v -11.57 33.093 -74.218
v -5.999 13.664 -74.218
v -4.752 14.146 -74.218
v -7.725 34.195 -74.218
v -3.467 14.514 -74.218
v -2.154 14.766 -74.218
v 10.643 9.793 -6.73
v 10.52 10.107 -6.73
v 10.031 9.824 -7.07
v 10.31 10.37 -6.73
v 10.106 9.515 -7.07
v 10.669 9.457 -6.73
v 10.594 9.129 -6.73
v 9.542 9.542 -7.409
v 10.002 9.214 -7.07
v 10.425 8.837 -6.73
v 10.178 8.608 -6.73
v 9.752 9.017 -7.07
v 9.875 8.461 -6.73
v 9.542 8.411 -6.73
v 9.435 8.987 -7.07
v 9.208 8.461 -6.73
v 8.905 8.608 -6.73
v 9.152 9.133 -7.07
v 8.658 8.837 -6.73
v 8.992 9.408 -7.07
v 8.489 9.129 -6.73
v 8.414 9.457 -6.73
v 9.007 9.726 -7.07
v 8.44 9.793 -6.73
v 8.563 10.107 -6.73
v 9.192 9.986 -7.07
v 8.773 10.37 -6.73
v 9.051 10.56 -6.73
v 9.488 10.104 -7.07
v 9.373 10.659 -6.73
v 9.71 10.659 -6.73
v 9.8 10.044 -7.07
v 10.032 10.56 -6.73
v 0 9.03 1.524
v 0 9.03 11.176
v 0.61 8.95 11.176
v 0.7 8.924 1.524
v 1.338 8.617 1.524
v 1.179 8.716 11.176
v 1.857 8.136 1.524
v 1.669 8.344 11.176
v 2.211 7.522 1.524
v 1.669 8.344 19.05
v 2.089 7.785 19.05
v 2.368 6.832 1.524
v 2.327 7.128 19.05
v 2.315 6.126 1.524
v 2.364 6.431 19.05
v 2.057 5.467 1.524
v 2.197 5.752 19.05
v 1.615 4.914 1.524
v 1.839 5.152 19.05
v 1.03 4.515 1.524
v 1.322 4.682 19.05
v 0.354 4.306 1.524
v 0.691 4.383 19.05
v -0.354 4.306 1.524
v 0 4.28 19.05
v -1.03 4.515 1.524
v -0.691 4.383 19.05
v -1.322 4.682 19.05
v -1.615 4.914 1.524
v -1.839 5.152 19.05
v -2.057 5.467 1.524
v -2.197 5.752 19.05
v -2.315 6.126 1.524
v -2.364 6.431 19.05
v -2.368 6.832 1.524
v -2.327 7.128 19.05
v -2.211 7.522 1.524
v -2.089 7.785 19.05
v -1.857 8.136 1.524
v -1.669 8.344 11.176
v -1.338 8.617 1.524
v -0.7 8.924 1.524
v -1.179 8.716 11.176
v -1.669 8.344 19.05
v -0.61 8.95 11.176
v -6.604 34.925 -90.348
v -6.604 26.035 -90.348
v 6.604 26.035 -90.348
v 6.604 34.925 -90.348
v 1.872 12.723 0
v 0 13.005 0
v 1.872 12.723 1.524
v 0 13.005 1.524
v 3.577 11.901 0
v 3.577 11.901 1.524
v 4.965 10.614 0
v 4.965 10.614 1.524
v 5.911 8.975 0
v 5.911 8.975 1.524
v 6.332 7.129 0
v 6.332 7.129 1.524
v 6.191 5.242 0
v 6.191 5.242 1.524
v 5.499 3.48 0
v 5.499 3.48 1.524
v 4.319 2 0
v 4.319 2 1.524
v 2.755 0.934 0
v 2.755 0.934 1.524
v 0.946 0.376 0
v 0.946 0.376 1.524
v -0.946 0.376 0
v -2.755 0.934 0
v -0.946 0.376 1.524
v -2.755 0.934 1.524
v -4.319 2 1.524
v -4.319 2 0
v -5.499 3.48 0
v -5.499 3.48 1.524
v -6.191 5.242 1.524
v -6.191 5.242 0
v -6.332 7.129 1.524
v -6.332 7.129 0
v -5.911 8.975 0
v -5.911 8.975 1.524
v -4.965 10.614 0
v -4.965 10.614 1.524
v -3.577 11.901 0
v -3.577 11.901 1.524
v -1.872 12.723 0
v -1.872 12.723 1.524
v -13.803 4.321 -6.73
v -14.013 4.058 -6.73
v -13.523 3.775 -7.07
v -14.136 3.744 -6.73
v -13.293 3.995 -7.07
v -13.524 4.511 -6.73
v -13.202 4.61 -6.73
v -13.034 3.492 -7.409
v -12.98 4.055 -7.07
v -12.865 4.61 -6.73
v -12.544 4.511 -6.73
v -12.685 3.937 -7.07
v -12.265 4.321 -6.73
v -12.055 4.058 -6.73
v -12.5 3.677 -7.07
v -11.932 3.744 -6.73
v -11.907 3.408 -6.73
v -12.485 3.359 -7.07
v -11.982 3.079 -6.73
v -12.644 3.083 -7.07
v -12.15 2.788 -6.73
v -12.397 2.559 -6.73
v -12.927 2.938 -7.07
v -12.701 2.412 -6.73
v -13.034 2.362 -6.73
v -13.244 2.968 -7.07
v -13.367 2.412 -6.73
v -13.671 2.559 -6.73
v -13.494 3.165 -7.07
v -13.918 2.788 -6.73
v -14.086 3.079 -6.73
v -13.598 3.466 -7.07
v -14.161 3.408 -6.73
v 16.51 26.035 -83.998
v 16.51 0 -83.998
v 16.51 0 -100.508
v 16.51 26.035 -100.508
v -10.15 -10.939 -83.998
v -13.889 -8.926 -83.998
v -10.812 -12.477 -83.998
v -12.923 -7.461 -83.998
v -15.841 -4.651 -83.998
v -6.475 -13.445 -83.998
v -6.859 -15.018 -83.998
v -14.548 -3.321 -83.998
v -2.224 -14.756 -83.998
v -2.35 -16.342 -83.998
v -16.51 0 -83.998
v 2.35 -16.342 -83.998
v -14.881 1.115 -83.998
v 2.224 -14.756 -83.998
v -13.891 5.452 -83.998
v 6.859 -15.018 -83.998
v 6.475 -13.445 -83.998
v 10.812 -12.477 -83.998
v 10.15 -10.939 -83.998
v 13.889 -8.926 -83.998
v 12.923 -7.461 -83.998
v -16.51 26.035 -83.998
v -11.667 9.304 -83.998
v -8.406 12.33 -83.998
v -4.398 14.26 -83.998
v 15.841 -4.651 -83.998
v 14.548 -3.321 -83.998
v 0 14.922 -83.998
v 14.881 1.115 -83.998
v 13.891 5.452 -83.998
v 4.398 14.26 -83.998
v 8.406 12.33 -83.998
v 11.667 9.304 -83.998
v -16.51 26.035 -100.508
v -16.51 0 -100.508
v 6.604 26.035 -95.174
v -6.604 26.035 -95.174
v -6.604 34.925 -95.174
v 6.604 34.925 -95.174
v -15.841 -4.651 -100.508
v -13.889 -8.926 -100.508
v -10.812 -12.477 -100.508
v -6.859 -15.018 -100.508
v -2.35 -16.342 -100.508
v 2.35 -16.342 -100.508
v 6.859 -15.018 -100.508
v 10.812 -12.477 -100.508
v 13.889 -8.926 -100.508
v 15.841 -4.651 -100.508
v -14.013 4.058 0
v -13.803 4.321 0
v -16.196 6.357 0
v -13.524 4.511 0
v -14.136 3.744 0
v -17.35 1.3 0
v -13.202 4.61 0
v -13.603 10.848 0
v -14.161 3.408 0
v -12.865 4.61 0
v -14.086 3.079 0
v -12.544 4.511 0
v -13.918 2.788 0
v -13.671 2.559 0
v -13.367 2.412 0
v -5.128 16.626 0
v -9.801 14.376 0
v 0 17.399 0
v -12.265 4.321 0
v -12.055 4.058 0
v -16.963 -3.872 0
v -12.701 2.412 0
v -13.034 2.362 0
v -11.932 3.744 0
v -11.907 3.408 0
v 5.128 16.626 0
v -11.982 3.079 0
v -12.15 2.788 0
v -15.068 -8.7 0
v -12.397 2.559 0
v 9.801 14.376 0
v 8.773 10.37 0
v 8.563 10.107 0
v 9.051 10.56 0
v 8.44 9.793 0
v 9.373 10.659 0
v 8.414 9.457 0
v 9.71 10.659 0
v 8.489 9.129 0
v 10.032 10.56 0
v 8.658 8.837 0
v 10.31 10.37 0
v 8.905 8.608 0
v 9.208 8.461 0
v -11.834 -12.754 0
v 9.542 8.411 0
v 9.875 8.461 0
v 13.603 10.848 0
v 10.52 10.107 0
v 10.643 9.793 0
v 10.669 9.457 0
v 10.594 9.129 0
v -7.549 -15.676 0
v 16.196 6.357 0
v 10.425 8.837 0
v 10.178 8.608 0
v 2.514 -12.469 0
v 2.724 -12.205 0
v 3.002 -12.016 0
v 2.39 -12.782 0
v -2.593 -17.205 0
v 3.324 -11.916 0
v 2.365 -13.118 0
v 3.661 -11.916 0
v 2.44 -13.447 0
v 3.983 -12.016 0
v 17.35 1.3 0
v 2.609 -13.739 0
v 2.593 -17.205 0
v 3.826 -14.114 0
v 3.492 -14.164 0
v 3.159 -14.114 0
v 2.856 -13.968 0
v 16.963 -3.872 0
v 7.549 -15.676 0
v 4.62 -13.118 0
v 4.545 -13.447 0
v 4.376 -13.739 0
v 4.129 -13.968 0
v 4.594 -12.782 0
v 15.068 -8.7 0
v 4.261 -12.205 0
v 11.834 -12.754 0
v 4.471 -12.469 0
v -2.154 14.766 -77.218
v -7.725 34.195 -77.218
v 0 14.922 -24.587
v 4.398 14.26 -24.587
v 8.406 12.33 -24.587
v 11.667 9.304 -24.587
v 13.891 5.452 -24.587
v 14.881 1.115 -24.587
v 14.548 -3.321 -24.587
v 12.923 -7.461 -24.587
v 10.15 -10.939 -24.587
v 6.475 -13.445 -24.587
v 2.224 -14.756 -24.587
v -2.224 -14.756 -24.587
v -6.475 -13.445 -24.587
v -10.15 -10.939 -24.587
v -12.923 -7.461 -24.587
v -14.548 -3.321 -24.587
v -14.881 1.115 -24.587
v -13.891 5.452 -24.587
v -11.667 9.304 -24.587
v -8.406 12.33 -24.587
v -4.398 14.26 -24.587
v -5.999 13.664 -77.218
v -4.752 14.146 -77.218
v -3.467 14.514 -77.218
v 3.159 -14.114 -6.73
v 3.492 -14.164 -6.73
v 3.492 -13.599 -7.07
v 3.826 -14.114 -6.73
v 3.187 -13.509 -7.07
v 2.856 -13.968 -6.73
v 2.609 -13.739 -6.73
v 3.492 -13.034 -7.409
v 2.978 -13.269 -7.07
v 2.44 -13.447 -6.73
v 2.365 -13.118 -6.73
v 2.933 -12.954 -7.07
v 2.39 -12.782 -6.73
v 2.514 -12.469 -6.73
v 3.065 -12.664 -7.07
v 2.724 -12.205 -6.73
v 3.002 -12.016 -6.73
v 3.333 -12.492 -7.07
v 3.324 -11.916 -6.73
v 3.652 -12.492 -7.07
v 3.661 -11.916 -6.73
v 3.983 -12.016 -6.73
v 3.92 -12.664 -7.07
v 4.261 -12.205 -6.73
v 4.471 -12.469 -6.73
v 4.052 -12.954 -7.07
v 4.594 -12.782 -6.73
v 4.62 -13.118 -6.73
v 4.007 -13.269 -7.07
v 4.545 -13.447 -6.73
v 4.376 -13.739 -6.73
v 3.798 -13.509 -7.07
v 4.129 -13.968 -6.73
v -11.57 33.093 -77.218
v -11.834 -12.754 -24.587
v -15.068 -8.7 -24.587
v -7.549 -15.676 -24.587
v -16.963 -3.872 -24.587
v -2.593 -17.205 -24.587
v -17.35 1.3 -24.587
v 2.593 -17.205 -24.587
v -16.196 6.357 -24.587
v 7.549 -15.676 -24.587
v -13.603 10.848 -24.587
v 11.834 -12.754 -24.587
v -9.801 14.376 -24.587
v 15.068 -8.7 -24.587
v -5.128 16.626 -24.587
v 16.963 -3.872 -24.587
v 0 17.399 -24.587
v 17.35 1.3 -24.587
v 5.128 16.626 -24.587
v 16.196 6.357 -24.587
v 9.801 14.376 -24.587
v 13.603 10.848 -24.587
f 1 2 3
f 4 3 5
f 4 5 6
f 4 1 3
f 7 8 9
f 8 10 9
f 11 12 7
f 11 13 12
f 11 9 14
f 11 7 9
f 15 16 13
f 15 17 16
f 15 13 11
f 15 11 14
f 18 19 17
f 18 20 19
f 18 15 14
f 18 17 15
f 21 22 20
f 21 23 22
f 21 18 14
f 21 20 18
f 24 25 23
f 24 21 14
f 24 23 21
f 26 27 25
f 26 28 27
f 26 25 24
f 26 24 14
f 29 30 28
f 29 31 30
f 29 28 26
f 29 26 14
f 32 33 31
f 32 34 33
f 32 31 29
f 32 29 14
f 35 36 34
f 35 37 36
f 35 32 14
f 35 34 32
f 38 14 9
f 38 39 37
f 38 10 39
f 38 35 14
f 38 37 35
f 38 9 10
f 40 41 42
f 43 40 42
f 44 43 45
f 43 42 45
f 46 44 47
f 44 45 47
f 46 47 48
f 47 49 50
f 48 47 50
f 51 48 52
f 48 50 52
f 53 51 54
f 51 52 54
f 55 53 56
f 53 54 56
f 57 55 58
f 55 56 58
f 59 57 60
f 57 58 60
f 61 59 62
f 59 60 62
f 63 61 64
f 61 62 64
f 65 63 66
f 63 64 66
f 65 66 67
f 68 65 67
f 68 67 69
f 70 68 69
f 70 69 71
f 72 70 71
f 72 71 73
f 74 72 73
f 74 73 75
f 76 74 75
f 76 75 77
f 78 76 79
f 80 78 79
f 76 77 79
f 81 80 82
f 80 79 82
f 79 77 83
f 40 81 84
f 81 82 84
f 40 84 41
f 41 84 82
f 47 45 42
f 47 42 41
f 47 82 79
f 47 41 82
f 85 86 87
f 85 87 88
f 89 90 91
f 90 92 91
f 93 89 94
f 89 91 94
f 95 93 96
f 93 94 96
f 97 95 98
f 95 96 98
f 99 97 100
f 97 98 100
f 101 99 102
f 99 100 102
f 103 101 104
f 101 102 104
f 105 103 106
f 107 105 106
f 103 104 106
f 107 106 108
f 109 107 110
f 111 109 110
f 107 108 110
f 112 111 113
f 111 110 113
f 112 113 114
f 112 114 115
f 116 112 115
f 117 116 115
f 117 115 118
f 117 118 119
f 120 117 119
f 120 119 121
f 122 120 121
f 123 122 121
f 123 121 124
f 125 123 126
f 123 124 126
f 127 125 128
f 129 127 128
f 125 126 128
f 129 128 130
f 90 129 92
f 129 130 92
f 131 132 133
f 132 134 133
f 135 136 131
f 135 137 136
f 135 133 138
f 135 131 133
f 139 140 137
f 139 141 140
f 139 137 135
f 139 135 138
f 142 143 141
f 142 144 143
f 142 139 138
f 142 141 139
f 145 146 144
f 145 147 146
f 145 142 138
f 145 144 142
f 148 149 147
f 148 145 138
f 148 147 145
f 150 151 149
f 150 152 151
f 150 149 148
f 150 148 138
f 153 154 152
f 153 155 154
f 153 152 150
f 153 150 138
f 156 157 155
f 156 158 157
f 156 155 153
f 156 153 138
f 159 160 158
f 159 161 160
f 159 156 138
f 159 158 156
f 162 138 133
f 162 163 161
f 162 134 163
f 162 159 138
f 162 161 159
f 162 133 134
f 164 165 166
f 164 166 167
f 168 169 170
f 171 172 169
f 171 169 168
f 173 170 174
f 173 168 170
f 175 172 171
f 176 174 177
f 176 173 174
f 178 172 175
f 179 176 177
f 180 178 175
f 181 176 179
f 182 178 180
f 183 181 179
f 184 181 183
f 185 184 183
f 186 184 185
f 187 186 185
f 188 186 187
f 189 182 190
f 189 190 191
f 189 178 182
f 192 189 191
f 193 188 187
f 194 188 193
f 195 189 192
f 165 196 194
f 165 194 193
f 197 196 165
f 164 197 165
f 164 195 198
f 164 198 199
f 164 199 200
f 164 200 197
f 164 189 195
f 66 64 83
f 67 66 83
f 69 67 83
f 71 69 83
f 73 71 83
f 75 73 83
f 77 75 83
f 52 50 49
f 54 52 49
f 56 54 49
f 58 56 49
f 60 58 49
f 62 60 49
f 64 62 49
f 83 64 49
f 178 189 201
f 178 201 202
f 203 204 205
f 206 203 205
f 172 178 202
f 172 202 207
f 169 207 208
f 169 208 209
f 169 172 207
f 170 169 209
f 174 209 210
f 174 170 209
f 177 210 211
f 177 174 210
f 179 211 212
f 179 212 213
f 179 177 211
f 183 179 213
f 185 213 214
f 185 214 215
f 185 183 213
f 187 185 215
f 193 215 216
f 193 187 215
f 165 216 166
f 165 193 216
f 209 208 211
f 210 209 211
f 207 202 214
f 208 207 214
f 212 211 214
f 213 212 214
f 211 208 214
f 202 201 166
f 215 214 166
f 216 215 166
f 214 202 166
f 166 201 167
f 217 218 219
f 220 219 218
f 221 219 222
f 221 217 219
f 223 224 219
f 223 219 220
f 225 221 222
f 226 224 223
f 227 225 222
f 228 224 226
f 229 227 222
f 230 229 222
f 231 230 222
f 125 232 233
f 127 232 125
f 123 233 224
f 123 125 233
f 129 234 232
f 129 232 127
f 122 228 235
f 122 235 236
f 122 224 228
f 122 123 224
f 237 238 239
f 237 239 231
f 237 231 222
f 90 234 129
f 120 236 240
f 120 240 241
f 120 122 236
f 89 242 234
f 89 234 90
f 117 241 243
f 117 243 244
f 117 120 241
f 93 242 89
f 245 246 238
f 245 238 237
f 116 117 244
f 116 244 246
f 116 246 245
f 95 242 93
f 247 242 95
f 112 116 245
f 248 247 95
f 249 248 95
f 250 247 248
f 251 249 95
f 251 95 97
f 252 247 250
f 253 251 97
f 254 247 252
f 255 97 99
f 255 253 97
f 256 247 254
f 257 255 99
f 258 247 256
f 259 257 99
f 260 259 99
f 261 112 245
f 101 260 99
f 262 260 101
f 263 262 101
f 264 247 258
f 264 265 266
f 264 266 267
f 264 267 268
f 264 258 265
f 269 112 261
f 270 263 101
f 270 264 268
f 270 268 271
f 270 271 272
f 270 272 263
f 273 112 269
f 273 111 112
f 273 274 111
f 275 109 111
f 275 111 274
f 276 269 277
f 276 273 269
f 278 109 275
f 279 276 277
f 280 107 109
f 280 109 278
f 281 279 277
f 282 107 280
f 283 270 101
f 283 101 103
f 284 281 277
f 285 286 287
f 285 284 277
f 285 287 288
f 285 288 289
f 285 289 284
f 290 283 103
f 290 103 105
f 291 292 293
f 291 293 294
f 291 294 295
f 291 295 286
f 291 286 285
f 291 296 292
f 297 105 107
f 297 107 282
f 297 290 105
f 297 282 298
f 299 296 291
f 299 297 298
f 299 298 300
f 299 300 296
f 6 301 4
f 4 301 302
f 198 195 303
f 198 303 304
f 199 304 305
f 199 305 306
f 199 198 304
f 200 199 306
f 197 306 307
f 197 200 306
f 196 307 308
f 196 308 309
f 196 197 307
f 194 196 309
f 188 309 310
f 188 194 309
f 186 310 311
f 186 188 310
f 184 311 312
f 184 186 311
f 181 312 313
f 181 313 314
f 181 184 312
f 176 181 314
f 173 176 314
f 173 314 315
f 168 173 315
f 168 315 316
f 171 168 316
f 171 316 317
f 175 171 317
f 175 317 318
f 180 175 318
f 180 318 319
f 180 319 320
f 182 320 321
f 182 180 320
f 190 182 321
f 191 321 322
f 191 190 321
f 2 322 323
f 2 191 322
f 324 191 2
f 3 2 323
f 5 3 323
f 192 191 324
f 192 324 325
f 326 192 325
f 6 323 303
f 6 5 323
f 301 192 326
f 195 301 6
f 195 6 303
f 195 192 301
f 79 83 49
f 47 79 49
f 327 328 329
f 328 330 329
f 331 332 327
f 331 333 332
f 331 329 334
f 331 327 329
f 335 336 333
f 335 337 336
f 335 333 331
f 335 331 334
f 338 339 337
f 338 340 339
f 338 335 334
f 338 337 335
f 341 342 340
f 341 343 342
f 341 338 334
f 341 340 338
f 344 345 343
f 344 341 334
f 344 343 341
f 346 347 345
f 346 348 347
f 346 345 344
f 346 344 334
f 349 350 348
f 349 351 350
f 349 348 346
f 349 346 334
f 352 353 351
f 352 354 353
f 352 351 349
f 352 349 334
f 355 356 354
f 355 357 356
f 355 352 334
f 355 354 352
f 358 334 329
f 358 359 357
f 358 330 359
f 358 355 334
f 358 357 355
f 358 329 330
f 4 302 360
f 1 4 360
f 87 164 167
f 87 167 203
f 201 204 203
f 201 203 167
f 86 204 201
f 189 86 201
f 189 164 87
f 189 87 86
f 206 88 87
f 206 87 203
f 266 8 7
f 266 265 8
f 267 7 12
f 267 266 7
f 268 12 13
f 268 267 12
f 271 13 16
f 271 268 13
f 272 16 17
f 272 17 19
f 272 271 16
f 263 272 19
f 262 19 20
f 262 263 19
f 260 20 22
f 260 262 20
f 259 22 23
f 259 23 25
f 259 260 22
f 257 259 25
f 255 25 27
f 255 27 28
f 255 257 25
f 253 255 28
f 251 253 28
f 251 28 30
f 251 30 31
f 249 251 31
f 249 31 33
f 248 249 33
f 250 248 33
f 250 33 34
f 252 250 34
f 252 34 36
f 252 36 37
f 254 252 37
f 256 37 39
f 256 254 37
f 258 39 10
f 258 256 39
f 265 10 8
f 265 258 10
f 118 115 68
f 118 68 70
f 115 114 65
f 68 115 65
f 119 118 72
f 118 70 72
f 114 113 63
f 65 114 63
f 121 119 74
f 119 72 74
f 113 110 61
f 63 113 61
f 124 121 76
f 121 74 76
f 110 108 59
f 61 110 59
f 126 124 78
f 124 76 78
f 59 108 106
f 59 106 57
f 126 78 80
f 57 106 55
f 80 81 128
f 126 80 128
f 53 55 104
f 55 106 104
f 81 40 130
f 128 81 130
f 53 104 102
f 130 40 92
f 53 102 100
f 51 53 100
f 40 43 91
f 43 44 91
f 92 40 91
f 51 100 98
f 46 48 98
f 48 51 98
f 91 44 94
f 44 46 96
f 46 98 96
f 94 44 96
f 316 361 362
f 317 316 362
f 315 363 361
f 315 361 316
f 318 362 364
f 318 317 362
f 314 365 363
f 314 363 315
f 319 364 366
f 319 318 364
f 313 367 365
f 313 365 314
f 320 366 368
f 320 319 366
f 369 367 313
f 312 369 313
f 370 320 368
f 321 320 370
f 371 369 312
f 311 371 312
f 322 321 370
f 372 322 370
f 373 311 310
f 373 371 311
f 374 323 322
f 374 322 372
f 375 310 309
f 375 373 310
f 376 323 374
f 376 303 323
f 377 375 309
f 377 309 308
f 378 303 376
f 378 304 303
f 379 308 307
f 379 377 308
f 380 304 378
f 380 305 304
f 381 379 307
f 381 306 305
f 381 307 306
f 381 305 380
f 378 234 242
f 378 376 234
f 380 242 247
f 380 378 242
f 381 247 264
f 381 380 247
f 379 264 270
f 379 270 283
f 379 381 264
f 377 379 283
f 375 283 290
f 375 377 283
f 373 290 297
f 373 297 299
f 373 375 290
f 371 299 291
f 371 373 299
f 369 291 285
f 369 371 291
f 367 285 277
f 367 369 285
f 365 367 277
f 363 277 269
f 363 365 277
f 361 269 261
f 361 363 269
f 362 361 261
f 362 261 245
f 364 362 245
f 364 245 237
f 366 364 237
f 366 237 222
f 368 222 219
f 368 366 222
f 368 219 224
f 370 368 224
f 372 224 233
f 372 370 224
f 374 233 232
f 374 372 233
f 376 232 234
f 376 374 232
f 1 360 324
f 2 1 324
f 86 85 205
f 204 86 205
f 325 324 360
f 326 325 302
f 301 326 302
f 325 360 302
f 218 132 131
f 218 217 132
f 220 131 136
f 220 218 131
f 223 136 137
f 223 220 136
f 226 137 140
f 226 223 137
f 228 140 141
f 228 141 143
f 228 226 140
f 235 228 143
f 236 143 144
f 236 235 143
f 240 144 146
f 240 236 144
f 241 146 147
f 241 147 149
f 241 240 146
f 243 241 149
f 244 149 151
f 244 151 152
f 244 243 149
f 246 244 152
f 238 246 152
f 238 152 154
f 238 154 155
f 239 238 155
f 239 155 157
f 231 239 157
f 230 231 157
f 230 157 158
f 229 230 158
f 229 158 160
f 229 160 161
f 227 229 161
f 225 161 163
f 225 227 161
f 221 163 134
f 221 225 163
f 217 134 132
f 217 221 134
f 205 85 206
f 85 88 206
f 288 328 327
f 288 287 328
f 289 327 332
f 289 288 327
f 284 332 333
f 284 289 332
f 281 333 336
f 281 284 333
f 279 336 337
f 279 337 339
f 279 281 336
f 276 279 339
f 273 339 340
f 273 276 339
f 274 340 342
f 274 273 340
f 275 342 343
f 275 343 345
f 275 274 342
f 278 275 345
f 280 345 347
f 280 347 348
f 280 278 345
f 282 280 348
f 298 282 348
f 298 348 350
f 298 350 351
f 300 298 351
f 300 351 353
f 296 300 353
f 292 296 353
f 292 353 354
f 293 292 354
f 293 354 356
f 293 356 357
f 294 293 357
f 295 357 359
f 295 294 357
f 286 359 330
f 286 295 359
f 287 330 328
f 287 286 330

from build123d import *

# Parameters (mm, degrees)
BOSS_EXTRUDE1_DEPTH = 16.51
SKETCH4_W           = 4.826
SKETCH4_H           = 8.89
BOSS_EXTRUDE2_DEPTH = 6.604
CUT_EXTRUDE1_DEPTH  = 7.874
CIRPATTERN1_COUNT   = 3
BOSS_EXTRUDE3_START = -23.29
BOSS_EXTRUDE3_DEPTH = 3


with BuildPart() as part:
    # Sketch1 → Revolve1 (revolve)
    with BuildSketch(Plane(origin=(0, 0, 0), x_dir=(0, 0, -1), z_dir=(1, 0, 0))):
        Polygon((0, 0), (0, 17.399), (24.5872, 17.399), (24.5872, 14.9225), (83.9978, 14.9225), (83.9978, 0), align=None)
    revolve(axis=Axis((0, 0, 55), (0, 0, -1)))

    # Sketch3 → Boss-Extrude1 (add)
    with BuildSketch(Plane(origin=(0, 0, -83.9978), x_dir=(-1, 0, 0), z_dir=(0, 0, -1))):
        with BuildLine():
            Line((-16.51, 0), (-16.51, 26.035))
            Line((-16.51, 26.035), (16.51, 26.035))
            Line((16.51, 26.035), (16.51, 0))
            ThreePointArc((16.51, 0), (0, -16.51), (-16.51, 0))
        make_face()
    extrude(amount=BOSS_EXTRUDE1_DEPTH)

    # Sketch4 → Boss-Extrude2 (add, symmetric)
    with BuildSketch(Plane(origin=(0, 0, 0), x_dir=(0, 0, -1), z_dir=(1, 0, 0))):
        with Locations((92.7608, 30.48)):
            Rectangle(SKETCH4_W, SKETCH4_H)
    extrude(amount=BOSS_EXTRUDE2_DEPTH, both=True)

    # Sketch5 → Revolve2 (revolve)
    with BuildSketch(Plane(origin=(0, 0, 0), x_dir=(0, 0, -1), z_dir=(1, 0, 0))):
        Polygon((0, 13.0048), (-1.524, 13.0048), (-1.524, 9.0297), (-19.05, 9.0297), (-19.05, 6.6548), (0, 6.6548), align=None)
    revolve(axis=Axis((0, 6.6548, 5.02539), (0, 0, -1)))

    # Sketch6 → Cut-Extrude1 (cut)
    with BuildSketch(Plane.XY.offset(19.05)):
        with BuildLine():
            Line((-1.669458355, 8.3439), (1.669458355, 8.3439))
            ThreePointArc((1.669458355, 8.3439), (0, 9.0297), (-1.669458355, 8.3439))
        make_face()
    extrude(amount=-CUT_EXTRUDE1_DEPTH, mode=Mode.SUBTRACT)

    # Sketch7 → #4-40 Tapped Hole1 (revolve, cut)
    with BuildSketch(Plane(origin=(3.49243949, -13.033961618, 0), x_dir=(0, -1, 0), z_dir=(1, 0, 0))):
        Polygon((0, 0), (0, 7.409152758), (1.1303, 6.73), (1.1303, 0), align=None)
    f_4_40_tapped_hole1 = revolve(axis=Axis((3.49243949, -13.033961618, 6.35), (0, 0, -1)), mode=Mode.SUBTRACT)

    # CirPattern1: #4-40 Tapped Hole1 ×3 about axis
    cirpattern1_axis = Axis((0, 0, 0), (0, 0, 1))
    for i in range(1, CIRPATTERN1_COUNT):
        add(f_4_40_tapped_hole1.rotate(cirpattern1_axis, i * 360 / CIRPATTERN1_COUNT), mode=Mode.SUBTRACT)

    # Sketch9 → Boss-Extrude3 (add)
    with BuildSketch(Plane(origin=(0, 0, -100.5078), x_dir=(-1, 0, 0), z_dir=(0, 0, -1)).offset(BOSS_EXTRUDE3_START)):
        Polygon((0, 0), (-1.922523392, 0.551274712), (7.724784062, 34.195434069), (11.569830845, 33.092884646), (1.922523392, -0.551274712), align=None)
    extrude(amount=-BOSS_EXTRUDE3_DEPTH)


solid = part.part
